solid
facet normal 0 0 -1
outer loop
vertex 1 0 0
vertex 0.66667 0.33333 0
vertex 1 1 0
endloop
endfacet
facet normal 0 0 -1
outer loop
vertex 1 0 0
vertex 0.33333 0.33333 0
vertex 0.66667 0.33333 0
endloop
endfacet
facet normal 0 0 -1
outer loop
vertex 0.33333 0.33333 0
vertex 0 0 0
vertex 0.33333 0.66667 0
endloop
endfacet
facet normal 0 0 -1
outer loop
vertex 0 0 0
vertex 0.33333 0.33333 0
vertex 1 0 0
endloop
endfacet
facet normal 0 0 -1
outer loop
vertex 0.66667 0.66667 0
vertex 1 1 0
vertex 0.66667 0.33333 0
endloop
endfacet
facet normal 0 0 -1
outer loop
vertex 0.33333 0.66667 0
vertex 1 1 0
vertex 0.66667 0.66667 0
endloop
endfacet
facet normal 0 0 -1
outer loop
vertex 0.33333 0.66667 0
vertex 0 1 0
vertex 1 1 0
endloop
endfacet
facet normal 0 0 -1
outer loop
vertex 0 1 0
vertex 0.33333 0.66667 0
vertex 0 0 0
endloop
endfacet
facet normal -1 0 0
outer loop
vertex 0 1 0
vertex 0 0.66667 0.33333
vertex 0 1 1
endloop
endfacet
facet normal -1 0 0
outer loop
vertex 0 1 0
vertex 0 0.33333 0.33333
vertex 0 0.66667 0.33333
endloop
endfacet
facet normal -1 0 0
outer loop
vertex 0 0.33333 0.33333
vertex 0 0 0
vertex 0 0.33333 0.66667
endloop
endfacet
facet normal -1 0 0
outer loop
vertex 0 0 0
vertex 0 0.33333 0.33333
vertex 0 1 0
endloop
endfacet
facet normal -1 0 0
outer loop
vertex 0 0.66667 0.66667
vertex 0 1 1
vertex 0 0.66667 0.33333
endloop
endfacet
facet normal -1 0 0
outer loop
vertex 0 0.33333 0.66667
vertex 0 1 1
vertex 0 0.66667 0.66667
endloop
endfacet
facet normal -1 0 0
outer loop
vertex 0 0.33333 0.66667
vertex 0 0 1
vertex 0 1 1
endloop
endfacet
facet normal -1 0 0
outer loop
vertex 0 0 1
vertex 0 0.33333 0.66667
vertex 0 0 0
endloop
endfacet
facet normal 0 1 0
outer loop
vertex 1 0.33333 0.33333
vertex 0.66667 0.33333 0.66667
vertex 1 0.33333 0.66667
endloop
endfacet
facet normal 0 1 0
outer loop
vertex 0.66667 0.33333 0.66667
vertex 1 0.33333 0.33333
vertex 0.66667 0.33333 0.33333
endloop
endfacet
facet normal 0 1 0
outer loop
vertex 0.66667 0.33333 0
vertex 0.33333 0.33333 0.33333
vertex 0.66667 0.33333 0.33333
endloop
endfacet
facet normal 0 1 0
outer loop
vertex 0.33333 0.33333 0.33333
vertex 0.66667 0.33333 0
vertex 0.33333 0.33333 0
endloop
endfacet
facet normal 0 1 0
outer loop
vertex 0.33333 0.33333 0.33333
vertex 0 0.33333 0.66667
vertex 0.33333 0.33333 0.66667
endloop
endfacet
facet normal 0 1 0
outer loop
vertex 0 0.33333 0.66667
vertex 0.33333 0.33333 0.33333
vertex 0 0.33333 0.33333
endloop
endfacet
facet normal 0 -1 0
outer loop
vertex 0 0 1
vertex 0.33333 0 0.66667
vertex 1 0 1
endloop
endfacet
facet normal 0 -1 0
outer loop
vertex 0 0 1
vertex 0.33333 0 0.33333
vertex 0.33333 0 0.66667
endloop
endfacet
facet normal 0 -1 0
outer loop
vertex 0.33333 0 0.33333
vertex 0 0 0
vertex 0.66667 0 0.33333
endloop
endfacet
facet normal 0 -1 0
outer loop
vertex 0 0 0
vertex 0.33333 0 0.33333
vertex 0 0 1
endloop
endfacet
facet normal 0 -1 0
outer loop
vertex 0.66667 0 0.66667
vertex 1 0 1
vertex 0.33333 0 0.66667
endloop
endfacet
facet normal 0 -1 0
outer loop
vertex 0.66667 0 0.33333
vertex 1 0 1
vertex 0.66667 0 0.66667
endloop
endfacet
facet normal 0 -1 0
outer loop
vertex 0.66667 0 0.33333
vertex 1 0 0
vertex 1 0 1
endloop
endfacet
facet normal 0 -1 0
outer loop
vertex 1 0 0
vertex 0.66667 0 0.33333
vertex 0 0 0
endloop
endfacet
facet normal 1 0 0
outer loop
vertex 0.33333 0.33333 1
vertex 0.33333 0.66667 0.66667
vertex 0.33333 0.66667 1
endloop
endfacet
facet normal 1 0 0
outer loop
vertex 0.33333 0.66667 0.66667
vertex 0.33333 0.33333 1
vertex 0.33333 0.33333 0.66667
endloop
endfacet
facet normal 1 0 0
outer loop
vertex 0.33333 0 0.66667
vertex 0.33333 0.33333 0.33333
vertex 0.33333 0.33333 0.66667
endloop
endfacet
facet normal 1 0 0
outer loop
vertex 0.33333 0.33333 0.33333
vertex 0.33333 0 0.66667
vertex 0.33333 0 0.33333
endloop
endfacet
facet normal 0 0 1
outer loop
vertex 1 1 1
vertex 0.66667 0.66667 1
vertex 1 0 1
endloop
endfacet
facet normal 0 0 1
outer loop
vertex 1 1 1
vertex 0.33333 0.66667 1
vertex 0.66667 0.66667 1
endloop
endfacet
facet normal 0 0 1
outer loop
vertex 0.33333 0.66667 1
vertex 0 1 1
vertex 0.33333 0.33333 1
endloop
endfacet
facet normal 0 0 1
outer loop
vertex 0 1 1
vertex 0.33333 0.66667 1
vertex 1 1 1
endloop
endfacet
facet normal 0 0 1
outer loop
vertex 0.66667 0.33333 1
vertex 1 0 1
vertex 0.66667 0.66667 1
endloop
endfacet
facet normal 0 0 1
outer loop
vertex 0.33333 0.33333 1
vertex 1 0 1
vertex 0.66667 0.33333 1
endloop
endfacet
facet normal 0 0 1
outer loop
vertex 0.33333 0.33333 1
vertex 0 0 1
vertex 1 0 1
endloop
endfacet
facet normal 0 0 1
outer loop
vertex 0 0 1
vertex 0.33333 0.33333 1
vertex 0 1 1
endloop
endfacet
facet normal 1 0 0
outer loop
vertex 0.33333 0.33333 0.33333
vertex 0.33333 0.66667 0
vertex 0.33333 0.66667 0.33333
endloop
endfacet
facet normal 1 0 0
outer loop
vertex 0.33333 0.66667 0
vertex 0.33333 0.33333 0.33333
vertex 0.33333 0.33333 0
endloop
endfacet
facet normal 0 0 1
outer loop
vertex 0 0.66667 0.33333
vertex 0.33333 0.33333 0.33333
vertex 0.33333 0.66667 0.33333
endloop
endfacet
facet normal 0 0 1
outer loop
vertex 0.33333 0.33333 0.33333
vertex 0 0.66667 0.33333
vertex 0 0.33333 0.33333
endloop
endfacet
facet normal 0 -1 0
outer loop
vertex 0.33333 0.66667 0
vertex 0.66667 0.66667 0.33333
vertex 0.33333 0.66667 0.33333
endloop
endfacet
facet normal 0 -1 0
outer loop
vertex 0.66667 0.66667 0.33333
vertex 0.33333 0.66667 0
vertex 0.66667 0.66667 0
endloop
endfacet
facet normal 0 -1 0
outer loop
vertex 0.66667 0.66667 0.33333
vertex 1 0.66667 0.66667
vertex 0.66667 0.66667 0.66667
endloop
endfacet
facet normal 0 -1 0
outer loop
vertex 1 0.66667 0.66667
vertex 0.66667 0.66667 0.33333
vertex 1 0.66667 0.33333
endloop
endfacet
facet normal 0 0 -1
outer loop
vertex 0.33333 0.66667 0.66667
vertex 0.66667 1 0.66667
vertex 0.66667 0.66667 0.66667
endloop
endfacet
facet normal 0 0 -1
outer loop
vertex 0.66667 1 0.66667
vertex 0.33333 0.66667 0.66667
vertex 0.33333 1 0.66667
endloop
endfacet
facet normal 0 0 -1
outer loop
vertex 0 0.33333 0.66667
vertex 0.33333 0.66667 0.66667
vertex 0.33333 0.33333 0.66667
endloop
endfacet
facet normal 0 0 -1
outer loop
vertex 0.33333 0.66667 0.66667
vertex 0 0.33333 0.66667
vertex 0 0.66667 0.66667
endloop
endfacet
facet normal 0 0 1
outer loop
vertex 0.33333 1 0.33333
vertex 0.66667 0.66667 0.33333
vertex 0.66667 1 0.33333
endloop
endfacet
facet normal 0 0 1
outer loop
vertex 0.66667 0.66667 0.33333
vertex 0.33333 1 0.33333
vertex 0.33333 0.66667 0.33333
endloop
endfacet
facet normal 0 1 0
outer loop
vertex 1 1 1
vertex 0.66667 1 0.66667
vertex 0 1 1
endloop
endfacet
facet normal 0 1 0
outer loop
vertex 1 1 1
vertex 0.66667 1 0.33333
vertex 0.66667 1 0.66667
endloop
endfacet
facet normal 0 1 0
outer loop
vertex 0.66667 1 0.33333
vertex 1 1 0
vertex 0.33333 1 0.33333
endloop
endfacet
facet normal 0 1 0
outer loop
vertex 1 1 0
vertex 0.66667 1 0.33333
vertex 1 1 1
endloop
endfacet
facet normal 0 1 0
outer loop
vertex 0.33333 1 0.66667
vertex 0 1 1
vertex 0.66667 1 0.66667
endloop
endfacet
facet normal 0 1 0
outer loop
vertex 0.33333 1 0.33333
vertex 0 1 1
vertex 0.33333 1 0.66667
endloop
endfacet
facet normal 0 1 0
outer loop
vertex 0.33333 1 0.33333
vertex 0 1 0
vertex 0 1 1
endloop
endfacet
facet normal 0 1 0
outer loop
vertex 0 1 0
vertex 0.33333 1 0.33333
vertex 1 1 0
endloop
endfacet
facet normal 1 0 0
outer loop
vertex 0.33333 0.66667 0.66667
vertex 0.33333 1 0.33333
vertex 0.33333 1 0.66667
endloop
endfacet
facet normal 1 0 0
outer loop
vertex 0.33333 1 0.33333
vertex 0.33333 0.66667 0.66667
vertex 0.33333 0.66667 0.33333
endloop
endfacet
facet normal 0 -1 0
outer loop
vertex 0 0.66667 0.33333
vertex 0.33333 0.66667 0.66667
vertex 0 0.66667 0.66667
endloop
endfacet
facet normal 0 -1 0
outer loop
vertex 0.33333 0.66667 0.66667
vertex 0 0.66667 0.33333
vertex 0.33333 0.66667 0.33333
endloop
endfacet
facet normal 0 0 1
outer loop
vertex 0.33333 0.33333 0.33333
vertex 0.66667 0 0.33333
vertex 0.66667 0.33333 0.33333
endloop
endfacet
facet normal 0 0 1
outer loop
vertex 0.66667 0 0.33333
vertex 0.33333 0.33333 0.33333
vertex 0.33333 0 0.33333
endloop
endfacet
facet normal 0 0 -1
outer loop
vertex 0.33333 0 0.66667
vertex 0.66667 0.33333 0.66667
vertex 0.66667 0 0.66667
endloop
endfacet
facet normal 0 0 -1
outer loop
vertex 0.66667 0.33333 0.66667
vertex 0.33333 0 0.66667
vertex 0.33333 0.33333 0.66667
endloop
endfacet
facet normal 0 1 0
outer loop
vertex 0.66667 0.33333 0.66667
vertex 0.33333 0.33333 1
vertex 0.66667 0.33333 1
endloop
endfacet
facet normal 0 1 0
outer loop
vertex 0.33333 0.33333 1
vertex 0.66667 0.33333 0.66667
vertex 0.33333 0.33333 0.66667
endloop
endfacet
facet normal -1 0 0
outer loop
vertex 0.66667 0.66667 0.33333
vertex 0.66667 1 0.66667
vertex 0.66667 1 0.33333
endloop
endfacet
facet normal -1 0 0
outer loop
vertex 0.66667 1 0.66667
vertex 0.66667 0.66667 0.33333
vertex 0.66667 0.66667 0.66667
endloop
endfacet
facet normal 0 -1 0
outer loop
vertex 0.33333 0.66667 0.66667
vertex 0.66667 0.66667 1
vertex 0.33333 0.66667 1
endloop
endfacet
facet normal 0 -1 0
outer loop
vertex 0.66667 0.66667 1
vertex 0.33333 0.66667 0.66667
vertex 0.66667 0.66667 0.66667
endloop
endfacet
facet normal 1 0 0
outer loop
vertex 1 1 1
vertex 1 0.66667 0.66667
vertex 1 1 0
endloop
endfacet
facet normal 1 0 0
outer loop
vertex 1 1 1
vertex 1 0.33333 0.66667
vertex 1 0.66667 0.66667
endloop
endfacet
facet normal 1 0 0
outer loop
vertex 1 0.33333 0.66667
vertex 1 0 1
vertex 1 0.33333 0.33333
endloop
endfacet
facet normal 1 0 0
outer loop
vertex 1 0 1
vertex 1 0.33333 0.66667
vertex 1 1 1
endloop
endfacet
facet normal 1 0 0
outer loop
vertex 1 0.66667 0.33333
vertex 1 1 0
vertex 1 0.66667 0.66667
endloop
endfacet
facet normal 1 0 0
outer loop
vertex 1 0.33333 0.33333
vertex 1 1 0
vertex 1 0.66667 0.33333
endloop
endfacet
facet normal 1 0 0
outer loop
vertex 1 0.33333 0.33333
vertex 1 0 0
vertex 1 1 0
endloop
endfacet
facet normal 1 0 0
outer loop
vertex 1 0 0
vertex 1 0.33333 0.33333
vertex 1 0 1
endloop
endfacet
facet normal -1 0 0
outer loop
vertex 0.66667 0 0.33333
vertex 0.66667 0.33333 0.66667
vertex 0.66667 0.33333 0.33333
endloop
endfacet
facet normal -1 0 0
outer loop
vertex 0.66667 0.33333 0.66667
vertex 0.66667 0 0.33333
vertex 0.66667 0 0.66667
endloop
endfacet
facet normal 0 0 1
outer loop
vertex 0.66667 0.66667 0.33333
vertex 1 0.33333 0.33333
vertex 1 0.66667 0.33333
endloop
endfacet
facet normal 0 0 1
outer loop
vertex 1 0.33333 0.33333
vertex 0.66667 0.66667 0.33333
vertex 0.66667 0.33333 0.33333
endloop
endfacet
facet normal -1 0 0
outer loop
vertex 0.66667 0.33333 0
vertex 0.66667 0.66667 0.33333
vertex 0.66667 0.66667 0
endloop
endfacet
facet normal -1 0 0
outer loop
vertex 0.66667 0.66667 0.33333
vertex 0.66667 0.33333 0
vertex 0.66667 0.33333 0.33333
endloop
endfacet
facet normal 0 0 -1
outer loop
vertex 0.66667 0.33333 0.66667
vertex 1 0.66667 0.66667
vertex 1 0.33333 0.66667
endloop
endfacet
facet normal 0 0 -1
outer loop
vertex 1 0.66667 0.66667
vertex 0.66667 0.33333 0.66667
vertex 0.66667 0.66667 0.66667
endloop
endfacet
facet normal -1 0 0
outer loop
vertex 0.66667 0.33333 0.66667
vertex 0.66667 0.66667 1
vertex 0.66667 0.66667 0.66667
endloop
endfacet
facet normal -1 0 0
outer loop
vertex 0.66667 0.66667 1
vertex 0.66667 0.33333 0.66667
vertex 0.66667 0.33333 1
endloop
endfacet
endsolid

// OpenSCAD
/* [Sponge] */

//  Type of sponge
sponge_type = 0;    // [0:#0 - Menger sponge,1:#1 - diagonal,2:#2 - pyramid00,3:#3 - pyramid01,4:#4 - pyramid10,5:#5 - pyramid11]

//  Level of sponge
level = 1;          //  [0:8]

//  Start with an inverse sponge on level 1?
start_inverse = false;

//  Flip normal/inverse between levels?
flip_to_inverse_between_levels = false;

//  Rotate sponge types between levels? If this is ON, then the sponge type above has no effect, and the sponge pattern below is used instead.
rotate_type_between_levels = false;

//  Rotate between these sponges:
sponge_pattern = [0, 0, 0, 0];  // [0:6]

/* [Position and Rotation] */

//  Center on origin?
center = false;

//  Rotation around the X axis (angles)
rot_x = 0;          // [-360:0.1:+360]

//  Rotation around the Y axis (angles)
rot_y = 0;          // [-360:0.1:+360]

//  Rotation around the Z axis (angles)
rot_z = 0;          // [-360:0.1:+360]

/*  [Hidden]  */

//  Voxels of the different types of 3x3x3 sponges for `filled == 1`.
//
//  The bitmaps are layered as follows in the below definitions:
//  bitmap = [ z2_layer, z1_layer, z0_layer ]
//  zi_layer = [ y2_row, y1_row, y0_row ]
//  yj_row = [x0_voxel, x1_voxel, x2_voxel]
//
//  In other words, the first 3x3 matrix is the top layer, then 3rd on is the
//  bottom layer. The lower left corner of each matrix is on the Z-axis. X/Y
//  grows right and up. So the array is in [z][y][x] order, but z and y are
//  flipped.
//
//  See (i.e. render) the level-1 `diagonal_bitmap` for more details.

menger_bitmap = [
    [
        [ 1, 1, 1 ],
        [ 1, 0, 1 ],
        [ 1, 1, 1 ],
    ],
    [
        [ 1, 0, 1 ],
        [ 0, 0, 0 ],
        [ 1, 0, 1 ],
    ],
    [
        [ 1, 1, 1 ],
        [ 1, 0, 1 ],
        [ 1, 1, 1 ],
    ],
];

diagonal_bitmap = [
    [
        [ 0, 0, 1 ],
        [ 0, 0, 0 ],
        [ 0, 0, 0 ],
    ],
    [
        [ 0, 0, 0 ],
        [ 0, 1, 0 ],
        [ 0, 0, 0 ],
    ],
    [
        [ 0, 0, 0 ],
        [ 0, 0, 0 ],
        [ 1, 0, 0 ],
    ],
];

pyramid00_bitmap = [
    [
        [ 0, 0, 0 ],
        [ 0, 0, 0 ],
        [ 1, 0, 0 ],
    ],
    [
        [ 0, 0, 0 ],
        [ 1, 1, 0 ],
        [ 1, 1, 0 ],
    ],
    [
        [ 1, 1, 1 ],
        [ 1, 1, 1 ],
        [ 1, 1, 1 ],
    ],
];

pyramid01_bitmap = [
    [
        [ 1, 0, 0 ],
        [ 0, 0, 0 ],
        [ 0, 0, 0 ],
    ],
    [
        [ 1, 1, 0 ],
        [ 1, 1, 0 ],
        [ 0, 0, 0 ],
    ],
    [
        [ 1, 1, 1 ],
        [ 1, 1, 1 ],
        [ 1, 1, 1 ],
    ],
];

pyramid10_bitmap = [
    [
        [ 0, 0, 0 ],
        [ 0, 0, 0 ],
        [ 0, 0, 1 ],
    ],
    [
        [ 0, 0, 0 ],
        [ 0, 1, 1 ],
        [ 0, 1, 1 ],
    ],
    [
        [ 1, 1, 1 ],
        [ 1, 1, 1 ],
        [ 1, 1, 1 ],
    ],
];

pyramid11_bitmap = [
    [
        [ 0, 0, 1 ],
        [ 0, 0, 0 ],
        [ 0, 0, 0 ],
    ],
    [
        [ 0, 1, 1 ],
        [ 0, 1, 1 ],
        [ 0, 0, 0 ],
    ],
    [
        [ 1, 1, 1 ],
        [ 1, 1, 1 ],
        [ 1, 1, 1 ],
    ],
];

//  All the bitmaps
//
//  NOTE:   Make sure the order in the customizer dropdown (see top
//          of this file) aligns with the below order or bitmaps.
bitmaps = [
    menger_bitmap,
    diagonal_bitmap,
    pyramid00_bitmap,
    pyramid01_bitmap,
    pyramid10_bitmap,
    pyramid11_bitmap,
];

//  Number of bitmaps
n_bitmaps = len(bitmaps);

module sponge(type=0, level=1, filled=1, flip=false, rotate_type=false) {
    assert(level >= 0,
        "Level of sponge must be non-negative");
    assert(filled == 0 || filled == 1,
        "Parameter `filled` must be either 0 or 1");

    if (level > 0) {
        //  If the sponge types are rotated between levels, then get the
        //  current type from the sponge pattern based on the level. Otherwise,
        //  use the specified type for the level.
        //
        //  NOTE:   We're in the `level > 0` case; level 0 is always a cube.
        this_type = rotate_type
            ? sponge_pattern[(level-1) % len(sponge_pattern)]
            : type;
        assert(0 <= this_type && this_type < n_bitmaps,
            concat("Invalid sponge type: ", str(this_type)));

        //  Level 1 and above, render the voxels out of
        //  third-sized sponges one level lower.
        //  Optionally flip to inverse.
        //
        //  NOTE:   It's easy to create 1x1x1 cubes everywhere (e.g. makes
        //          the coordinates simpler). But we want the end result to be
        //          1x1x1, so we scale everything down once this level is done.
        scale([1/3, 1/3, 1/3]) {
            for (x = [0:2], y = [0:2], z = [0:2]) {
                //  This weird [2-z][2-y][x] indexing makes sure that the
                //  bitmap definions above make sense visually and the
                //  3D coordinates make sense here.
                if (bitmaps[this_type][2-z][2-y][x] == filled) {
                    translate([x, y, z])
                    sponge(
                        type,
                        level-1,
                        flip ? 1-filled : filled,
                        flip,
                        rotate_type
                    );
                }
            }
        }
    }
    else {
        //  A level-0 sponge is just a cube, no matter its type.
        cube();
    }
}

//  The sponge is 1x1x1 in size
translation = center ? [-0.5, -0.5, -0.5] : [0,0,0];

//  Log debugging info to console

echo("========================================");

echo("bitmaps:");
for (bm = bitmaps) {
    echo(bm);
}

echo("----------------------------------------");

echo("sponge type", sponge_type);
echo("starting level", level);
echo("start inverse", start_inverse);
echo("flip to inverse between levels", flip_to_inverse_between_levels);
echo("rotate sponge type between levels", rotate_type_between_levels);
if (rotate_type_between_levels) {
    echo("sponge pattern", sponge_pattern);
}

echo("----------------------------------------");

echo("X/Y/Z rotation:", rot_x, rot_y, rot_z);
echo("center", center);

//  Render sponge
rotate(a=[rot_x, rot_y, rot_z])
translate(translation)
sponge(
    type = rotate_type_between_levels ? 0 : sponge_type,
    level = level,
    filled = start_inverse ? 0 : 1,
    flip = flip_to_inverse_between_levels,
    rotate_type = rotate_type_between_levels
);

echo("========================================");
